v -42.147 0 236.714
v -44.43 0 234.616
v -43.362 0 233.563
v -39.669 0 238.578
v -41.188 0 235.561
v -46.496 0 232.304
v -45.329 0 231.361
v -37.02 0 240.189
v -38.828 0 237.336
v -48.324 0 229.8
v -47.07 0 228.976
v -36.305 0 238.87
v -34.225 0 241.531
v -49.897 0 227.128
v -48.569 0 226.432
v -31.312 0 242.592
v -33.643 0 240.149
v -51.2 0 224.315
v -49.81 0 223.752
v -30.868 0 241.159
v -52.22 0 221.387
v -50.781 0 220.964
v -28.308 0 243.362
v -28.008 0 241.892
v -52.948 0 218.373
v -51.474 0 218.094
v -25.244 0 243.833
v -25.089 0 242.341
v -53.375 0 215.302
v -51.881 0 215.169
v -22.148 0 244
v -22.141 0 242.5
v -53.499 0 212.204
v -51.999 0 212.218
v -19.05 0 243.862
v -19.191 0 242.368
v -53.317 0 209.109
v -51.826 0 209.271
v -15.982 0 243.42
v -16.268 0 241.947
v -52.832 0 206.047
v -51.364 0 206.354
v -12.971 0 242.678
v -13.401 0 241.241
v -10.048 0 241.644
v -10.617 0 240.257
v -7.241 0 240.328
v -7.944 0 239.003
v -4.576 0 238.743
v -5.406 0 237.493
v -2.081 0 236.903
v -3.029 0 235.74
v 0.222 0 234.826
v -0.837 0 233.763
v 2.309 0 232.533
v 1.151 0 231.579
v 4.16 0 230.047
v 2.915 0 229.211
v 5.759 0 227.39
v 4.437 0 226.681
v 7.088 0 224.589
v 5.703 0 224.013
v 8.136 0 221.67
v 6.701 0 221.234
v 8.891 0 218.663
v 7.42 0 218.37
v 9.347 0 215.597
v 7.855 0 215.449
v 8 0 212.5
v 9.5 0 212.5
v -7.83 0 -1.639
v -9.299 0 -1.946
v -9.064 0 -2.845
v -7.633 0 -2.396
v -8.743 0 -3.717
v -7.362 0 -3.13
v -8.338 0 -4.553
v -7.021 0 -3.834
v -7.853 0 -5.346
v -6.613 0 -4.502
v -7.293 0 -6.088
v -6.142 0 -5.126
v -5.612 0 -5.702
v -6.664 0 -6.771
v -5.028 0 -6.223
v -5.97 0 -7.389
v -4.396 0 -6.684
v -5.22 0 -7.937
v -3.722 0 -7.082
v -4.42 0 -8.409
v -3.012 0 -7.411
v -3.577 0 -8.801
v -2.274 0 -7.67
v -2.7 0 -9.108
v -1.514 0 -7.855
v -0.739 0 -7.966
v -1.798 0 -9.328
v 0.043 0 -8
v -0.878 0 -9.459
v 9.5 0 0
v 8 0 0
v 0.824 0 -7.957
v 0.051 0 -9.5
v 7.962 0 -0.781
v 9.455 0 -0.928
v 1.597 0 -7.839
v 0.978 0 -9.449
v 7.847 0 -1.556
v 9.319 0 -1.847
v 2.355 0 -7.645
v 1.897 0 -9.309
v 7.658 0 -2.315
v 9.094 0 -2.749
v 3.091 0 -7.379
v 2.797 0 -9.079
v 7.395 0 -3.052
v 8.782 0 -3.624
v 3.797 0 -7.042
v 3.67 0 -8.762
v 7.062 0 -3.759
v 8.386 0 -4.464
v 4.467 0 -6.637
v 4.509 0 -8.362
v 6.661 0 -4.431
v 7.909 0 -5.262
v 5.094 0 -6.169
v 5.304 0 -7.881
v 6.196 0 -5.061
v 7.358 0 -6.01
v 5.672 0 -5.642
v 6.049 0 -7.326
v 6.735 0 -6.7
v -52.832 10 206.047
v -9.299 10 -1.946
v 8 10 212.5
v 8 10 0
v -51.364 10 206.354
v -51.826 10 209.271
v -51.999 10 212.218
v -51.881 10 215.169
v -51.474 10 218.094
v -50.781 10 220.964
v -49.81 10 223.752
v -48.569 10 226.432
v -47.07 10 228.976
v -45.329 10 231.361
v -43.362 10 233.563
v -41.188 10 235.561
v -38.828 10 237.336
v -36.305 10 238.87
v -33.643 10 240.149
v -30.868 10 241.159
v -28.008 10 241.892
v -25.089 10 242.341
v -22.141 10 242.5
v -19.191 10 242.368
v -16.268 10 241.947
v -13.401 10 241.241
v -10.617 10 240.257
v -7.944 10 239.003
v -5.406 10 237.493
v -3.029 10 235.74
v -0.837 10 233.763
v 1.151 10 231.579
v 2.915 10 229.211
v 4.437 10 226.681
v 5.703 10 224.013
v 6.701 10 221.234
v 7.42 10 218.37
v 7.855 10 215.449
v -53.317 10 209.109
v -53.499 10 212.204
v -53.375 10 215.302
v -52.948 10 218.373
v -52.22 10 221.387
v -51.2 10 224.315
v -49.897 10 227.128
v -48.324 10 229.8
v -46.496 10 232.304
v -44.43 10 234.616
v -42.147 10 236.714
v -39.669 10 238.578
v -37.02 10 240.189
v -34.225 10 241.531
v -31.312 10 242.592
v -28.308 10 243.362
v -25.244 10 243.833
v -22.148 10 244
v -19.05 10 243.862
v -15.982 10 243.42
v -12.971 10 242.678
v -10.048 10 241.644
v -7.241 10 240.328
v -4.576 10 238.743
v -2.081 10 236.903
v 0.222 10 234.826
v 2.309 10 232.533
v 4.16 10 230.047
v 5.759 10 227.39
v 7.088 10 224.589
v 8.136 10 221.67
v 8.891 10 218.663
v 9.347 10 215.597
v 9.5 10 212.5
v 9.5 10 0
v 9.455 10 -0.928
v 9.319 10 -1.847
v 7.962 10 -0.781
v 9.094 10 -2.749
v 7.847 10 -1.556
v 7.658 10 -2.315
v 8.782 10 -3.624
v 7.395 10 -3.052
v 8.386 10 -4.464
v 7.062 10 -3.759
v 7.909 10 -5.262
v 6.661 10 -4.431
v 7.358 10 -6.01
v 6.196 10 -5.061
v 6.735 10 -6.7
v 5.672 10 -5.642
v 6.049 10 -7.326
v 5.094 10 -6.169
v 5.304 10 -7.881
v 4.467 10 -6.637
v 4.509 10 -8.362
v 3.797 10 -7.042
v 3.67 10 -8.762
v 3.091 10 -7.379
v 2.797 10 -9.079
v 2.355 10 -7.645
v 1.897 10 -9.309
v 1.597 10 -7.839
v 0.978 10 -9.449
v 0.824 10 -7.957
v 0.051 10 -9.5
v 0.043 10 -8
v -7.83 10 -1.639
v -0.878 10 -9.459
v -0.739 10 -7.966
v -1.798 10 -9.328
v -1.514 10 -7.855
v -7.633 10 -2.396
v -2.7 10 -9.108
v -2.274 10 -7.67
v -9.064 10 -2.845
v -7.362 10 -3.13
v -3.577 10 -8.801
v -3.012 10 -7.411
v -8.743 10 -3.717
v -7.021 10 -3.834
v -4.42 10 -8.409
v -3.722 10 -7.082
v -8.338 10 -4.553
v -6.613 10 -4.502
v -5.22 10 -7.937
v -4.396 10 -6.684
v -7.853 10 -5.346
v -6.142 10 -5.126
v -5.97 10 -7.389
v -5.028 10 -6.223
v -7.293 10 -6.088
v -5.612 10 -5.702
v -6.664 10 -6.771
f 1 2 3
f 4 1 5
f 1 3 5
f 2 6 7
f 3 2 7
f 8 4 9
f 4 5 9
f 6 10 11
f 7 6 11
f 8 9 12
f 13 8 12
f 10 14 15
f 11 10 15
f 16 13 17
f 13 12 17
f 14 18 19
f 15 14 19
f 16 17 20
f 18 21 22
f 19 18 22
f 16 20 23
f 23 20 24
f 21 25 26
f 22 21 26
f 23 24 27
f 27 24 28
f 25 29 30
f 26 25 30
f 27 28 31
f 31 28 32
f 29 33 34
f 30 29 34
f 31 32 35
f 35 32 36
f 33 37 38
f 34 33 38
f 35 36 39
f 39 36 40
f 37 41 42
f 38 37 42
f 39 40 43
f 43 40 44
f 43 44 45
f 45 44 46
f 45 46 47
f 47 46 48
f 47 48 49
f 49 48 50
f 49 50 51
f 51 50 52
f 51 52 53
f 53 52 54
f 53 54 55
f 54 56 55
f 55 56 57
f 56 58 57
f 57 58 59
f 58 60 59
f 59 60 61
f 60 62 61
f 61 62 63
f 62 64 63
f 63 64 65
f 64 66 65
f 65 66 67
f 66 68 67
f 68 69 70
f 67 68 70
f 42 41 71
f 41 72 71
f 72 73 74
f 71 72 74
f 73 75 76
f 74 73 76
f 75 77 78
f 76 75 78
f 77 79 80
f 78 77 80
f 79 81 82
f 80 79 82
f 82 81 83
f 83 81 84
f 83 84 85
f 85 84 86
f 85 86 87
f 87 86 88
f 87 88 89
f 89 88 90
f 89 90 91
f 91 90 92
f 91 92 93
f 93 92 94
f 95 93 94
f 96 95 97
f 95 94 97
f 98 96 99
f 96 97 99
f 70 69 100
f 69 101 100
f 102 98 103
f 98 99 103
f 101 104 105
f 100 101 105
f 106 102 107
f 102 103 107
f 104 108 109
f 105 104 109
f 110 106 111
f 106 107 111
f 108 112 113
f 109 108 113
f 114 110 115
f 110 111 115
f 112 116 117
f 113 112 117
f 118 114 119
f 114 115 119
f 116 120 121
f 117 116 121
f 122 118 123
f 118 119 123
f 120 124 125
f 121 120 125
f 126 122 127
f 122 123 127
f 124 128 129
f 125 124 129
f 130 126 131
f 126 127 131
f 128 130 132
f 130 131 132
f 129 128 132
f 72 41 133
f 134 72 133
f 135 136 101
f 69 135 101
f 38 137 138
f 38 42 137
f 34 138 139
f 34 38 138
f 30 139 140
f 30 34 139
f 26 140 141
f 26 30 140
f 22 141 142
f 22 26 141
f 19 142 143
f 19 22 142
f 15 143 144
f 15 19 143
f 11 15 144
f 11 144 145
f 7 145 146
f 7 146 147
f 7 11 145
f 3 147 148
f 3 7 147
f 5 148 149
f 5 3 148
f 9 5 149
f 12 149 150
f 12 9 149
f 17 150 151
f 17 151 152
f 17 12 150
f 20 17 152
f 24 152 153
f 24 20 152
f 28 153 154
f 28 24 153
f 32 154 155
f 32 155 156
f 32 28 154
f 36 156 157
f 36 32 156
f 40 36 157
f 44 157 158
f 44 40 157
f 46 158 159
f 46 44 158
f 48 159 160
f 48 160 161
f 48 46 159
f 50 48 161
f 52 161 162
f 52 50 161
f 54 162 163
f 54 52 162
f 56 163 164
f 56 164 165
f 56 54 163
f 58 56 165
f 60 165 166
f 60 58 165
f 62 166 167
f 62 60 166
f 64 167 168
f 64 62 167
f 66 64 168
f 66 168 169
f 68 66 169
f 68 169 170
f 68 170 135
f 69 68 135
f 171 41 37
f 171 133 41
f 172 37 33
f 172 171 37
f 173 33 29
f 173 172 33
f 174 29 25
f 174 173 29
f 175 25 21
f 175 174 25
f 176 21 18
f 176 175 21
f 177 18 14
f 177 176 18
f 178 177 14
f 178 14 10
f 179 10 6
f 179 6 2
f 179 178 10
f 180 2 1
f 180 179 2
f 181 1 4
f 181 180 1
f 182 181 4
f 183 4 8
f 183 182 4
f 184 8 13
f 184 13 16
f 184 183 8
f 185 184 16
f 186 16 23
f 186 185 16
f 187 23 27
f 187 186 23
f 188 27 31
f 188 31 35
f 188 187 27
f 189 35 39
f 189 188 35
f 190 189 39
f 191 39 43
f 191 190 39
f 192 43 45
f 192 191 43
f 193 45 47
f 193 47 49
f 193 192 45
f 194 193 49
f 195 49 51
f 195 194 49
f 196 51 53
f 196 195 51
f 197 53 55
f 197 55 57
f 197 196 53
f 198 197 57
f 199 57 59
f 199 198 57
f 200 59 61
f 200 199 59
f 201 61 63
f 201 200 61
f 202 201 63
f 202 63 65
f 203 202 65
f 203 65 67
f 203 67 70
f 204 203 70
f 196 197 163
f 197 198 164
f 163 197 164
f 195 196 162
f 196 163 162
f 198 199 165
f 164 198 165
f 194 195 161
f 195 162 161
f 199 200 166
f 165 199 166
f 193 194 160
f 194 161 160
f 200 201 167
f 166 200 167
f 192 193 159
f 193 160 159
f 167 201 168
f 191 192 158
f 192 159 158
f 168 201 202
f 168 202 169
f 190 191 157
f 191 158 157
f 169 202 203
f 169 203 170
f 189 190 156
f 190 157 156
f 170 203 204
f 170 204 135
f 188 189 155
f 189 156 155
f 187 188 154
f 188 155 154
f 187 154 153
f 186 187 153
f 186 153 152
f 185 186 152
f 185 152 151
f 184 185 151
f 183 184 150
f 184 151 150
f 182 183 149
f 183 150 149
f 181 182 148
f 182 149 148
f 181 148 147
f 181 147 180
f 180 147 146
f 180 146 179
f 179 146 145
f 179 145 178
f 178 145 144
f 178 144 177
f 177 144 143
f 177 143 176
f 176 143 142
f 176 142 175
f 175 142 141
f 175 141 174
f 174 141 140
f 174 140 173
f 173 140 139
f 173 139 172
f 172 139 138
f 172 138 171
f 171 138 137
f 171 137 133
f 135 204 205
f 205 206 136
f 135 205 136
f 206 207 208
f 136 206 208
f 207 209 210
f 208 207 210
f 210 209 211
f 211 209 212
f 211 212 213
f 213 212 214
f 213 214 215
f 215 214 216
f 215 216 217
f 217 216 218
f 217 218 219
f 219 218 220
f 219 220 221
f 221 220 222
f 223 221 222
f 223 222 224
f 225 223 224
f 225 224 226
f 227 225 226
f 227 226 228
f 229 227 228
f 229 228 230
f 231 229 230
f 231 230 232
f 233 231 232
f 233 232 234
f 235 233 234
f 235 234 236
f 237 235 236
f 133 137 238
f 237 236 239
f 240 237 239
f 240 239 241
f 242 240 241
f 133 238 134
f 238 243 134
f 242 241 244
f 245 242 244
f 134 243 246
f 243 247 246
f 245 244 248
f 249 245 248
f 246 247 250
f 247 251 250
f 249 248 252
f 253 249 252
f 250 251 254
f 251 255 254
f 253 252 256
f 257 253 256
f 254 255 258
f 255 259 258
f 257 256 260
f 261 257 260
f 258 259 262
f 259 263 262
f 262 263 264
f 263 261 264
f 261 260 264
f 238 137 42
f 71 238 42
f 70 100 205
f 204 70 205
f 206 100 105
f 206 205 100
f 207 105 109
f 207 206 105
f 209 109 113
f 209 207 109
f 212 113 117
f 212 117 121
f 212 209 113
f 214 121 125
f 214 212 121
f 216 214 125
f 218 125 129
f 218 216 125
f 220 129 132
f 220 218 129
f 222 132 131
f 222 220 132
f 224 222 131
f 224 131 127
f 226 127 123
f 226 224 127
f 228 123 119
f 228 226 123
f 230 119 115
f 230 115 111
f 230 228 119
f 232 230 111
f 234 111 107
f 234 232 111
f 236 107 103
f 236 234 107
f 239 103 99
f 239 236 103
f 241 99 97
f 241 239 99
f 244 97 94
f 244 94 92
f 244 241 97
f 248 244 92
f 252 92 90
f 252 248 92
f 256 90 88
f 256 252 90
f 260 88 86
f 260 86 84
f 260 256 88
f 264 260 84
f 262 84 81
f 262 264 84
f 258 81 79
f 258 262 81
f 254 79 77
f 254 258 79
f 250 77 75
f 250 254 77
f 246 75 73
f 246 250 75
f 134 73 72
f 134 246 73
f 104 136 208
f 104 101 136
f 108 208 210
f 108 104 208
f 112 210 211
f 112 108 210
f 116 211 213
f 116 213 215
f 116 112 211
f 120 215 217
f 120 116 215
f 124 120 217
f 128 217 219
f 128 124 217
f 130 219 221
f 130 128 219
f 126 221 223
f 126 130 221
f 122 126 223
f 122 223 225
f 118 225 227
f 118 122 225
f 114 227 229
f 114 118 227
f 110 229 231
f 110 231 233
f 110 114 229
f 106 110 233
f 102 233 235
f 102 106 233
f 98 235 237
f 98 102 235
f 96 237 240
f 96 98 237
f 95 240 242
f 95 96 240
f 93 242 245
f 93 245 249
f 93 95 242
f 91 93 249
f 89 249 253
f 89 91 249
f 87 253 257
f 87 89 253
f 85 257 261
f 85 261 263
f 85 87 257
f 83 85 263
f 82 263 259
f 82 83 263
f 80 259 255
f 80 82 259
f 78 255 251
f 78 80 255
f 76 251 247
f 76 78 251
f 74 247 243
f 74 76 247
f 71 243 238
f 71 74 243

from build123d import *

# Parameters (mm, degrees)
SKETCH_3_W = 1.5
SKETCH_3_H = 10


with BuildPart() as part:
    # 扫描1: sweep along a path in 草图2
    with BuildLine(Plane(origin=(0, 0, 0), x_dir=(1, 0, 0), z_dir=(0, 1, 0))) as sweep_1_path:
        Line((8, -212.5), (8, 0))
        ThreePointArc((8, 0), (0.823832006, 7.957468242), (-7.830325206, 1.638904257))
        Line((-7.830325206, 1.638904257), (-51.363719524, -206.354109038))
        ThreePointArc((-51.363719524, -206.354109038), (-25.089370023, -242.340505908), (8, -212.5))
    # 草图3 → 扫描1 (sweep)
    with BuildSketch(Plane.XY):
        with Locations((8.75, 5)):
            Rectangle(SKETCH_3_W, SKETCH_3_H)
    sweep(path=sweep_1_path.line)


solid = part.part
